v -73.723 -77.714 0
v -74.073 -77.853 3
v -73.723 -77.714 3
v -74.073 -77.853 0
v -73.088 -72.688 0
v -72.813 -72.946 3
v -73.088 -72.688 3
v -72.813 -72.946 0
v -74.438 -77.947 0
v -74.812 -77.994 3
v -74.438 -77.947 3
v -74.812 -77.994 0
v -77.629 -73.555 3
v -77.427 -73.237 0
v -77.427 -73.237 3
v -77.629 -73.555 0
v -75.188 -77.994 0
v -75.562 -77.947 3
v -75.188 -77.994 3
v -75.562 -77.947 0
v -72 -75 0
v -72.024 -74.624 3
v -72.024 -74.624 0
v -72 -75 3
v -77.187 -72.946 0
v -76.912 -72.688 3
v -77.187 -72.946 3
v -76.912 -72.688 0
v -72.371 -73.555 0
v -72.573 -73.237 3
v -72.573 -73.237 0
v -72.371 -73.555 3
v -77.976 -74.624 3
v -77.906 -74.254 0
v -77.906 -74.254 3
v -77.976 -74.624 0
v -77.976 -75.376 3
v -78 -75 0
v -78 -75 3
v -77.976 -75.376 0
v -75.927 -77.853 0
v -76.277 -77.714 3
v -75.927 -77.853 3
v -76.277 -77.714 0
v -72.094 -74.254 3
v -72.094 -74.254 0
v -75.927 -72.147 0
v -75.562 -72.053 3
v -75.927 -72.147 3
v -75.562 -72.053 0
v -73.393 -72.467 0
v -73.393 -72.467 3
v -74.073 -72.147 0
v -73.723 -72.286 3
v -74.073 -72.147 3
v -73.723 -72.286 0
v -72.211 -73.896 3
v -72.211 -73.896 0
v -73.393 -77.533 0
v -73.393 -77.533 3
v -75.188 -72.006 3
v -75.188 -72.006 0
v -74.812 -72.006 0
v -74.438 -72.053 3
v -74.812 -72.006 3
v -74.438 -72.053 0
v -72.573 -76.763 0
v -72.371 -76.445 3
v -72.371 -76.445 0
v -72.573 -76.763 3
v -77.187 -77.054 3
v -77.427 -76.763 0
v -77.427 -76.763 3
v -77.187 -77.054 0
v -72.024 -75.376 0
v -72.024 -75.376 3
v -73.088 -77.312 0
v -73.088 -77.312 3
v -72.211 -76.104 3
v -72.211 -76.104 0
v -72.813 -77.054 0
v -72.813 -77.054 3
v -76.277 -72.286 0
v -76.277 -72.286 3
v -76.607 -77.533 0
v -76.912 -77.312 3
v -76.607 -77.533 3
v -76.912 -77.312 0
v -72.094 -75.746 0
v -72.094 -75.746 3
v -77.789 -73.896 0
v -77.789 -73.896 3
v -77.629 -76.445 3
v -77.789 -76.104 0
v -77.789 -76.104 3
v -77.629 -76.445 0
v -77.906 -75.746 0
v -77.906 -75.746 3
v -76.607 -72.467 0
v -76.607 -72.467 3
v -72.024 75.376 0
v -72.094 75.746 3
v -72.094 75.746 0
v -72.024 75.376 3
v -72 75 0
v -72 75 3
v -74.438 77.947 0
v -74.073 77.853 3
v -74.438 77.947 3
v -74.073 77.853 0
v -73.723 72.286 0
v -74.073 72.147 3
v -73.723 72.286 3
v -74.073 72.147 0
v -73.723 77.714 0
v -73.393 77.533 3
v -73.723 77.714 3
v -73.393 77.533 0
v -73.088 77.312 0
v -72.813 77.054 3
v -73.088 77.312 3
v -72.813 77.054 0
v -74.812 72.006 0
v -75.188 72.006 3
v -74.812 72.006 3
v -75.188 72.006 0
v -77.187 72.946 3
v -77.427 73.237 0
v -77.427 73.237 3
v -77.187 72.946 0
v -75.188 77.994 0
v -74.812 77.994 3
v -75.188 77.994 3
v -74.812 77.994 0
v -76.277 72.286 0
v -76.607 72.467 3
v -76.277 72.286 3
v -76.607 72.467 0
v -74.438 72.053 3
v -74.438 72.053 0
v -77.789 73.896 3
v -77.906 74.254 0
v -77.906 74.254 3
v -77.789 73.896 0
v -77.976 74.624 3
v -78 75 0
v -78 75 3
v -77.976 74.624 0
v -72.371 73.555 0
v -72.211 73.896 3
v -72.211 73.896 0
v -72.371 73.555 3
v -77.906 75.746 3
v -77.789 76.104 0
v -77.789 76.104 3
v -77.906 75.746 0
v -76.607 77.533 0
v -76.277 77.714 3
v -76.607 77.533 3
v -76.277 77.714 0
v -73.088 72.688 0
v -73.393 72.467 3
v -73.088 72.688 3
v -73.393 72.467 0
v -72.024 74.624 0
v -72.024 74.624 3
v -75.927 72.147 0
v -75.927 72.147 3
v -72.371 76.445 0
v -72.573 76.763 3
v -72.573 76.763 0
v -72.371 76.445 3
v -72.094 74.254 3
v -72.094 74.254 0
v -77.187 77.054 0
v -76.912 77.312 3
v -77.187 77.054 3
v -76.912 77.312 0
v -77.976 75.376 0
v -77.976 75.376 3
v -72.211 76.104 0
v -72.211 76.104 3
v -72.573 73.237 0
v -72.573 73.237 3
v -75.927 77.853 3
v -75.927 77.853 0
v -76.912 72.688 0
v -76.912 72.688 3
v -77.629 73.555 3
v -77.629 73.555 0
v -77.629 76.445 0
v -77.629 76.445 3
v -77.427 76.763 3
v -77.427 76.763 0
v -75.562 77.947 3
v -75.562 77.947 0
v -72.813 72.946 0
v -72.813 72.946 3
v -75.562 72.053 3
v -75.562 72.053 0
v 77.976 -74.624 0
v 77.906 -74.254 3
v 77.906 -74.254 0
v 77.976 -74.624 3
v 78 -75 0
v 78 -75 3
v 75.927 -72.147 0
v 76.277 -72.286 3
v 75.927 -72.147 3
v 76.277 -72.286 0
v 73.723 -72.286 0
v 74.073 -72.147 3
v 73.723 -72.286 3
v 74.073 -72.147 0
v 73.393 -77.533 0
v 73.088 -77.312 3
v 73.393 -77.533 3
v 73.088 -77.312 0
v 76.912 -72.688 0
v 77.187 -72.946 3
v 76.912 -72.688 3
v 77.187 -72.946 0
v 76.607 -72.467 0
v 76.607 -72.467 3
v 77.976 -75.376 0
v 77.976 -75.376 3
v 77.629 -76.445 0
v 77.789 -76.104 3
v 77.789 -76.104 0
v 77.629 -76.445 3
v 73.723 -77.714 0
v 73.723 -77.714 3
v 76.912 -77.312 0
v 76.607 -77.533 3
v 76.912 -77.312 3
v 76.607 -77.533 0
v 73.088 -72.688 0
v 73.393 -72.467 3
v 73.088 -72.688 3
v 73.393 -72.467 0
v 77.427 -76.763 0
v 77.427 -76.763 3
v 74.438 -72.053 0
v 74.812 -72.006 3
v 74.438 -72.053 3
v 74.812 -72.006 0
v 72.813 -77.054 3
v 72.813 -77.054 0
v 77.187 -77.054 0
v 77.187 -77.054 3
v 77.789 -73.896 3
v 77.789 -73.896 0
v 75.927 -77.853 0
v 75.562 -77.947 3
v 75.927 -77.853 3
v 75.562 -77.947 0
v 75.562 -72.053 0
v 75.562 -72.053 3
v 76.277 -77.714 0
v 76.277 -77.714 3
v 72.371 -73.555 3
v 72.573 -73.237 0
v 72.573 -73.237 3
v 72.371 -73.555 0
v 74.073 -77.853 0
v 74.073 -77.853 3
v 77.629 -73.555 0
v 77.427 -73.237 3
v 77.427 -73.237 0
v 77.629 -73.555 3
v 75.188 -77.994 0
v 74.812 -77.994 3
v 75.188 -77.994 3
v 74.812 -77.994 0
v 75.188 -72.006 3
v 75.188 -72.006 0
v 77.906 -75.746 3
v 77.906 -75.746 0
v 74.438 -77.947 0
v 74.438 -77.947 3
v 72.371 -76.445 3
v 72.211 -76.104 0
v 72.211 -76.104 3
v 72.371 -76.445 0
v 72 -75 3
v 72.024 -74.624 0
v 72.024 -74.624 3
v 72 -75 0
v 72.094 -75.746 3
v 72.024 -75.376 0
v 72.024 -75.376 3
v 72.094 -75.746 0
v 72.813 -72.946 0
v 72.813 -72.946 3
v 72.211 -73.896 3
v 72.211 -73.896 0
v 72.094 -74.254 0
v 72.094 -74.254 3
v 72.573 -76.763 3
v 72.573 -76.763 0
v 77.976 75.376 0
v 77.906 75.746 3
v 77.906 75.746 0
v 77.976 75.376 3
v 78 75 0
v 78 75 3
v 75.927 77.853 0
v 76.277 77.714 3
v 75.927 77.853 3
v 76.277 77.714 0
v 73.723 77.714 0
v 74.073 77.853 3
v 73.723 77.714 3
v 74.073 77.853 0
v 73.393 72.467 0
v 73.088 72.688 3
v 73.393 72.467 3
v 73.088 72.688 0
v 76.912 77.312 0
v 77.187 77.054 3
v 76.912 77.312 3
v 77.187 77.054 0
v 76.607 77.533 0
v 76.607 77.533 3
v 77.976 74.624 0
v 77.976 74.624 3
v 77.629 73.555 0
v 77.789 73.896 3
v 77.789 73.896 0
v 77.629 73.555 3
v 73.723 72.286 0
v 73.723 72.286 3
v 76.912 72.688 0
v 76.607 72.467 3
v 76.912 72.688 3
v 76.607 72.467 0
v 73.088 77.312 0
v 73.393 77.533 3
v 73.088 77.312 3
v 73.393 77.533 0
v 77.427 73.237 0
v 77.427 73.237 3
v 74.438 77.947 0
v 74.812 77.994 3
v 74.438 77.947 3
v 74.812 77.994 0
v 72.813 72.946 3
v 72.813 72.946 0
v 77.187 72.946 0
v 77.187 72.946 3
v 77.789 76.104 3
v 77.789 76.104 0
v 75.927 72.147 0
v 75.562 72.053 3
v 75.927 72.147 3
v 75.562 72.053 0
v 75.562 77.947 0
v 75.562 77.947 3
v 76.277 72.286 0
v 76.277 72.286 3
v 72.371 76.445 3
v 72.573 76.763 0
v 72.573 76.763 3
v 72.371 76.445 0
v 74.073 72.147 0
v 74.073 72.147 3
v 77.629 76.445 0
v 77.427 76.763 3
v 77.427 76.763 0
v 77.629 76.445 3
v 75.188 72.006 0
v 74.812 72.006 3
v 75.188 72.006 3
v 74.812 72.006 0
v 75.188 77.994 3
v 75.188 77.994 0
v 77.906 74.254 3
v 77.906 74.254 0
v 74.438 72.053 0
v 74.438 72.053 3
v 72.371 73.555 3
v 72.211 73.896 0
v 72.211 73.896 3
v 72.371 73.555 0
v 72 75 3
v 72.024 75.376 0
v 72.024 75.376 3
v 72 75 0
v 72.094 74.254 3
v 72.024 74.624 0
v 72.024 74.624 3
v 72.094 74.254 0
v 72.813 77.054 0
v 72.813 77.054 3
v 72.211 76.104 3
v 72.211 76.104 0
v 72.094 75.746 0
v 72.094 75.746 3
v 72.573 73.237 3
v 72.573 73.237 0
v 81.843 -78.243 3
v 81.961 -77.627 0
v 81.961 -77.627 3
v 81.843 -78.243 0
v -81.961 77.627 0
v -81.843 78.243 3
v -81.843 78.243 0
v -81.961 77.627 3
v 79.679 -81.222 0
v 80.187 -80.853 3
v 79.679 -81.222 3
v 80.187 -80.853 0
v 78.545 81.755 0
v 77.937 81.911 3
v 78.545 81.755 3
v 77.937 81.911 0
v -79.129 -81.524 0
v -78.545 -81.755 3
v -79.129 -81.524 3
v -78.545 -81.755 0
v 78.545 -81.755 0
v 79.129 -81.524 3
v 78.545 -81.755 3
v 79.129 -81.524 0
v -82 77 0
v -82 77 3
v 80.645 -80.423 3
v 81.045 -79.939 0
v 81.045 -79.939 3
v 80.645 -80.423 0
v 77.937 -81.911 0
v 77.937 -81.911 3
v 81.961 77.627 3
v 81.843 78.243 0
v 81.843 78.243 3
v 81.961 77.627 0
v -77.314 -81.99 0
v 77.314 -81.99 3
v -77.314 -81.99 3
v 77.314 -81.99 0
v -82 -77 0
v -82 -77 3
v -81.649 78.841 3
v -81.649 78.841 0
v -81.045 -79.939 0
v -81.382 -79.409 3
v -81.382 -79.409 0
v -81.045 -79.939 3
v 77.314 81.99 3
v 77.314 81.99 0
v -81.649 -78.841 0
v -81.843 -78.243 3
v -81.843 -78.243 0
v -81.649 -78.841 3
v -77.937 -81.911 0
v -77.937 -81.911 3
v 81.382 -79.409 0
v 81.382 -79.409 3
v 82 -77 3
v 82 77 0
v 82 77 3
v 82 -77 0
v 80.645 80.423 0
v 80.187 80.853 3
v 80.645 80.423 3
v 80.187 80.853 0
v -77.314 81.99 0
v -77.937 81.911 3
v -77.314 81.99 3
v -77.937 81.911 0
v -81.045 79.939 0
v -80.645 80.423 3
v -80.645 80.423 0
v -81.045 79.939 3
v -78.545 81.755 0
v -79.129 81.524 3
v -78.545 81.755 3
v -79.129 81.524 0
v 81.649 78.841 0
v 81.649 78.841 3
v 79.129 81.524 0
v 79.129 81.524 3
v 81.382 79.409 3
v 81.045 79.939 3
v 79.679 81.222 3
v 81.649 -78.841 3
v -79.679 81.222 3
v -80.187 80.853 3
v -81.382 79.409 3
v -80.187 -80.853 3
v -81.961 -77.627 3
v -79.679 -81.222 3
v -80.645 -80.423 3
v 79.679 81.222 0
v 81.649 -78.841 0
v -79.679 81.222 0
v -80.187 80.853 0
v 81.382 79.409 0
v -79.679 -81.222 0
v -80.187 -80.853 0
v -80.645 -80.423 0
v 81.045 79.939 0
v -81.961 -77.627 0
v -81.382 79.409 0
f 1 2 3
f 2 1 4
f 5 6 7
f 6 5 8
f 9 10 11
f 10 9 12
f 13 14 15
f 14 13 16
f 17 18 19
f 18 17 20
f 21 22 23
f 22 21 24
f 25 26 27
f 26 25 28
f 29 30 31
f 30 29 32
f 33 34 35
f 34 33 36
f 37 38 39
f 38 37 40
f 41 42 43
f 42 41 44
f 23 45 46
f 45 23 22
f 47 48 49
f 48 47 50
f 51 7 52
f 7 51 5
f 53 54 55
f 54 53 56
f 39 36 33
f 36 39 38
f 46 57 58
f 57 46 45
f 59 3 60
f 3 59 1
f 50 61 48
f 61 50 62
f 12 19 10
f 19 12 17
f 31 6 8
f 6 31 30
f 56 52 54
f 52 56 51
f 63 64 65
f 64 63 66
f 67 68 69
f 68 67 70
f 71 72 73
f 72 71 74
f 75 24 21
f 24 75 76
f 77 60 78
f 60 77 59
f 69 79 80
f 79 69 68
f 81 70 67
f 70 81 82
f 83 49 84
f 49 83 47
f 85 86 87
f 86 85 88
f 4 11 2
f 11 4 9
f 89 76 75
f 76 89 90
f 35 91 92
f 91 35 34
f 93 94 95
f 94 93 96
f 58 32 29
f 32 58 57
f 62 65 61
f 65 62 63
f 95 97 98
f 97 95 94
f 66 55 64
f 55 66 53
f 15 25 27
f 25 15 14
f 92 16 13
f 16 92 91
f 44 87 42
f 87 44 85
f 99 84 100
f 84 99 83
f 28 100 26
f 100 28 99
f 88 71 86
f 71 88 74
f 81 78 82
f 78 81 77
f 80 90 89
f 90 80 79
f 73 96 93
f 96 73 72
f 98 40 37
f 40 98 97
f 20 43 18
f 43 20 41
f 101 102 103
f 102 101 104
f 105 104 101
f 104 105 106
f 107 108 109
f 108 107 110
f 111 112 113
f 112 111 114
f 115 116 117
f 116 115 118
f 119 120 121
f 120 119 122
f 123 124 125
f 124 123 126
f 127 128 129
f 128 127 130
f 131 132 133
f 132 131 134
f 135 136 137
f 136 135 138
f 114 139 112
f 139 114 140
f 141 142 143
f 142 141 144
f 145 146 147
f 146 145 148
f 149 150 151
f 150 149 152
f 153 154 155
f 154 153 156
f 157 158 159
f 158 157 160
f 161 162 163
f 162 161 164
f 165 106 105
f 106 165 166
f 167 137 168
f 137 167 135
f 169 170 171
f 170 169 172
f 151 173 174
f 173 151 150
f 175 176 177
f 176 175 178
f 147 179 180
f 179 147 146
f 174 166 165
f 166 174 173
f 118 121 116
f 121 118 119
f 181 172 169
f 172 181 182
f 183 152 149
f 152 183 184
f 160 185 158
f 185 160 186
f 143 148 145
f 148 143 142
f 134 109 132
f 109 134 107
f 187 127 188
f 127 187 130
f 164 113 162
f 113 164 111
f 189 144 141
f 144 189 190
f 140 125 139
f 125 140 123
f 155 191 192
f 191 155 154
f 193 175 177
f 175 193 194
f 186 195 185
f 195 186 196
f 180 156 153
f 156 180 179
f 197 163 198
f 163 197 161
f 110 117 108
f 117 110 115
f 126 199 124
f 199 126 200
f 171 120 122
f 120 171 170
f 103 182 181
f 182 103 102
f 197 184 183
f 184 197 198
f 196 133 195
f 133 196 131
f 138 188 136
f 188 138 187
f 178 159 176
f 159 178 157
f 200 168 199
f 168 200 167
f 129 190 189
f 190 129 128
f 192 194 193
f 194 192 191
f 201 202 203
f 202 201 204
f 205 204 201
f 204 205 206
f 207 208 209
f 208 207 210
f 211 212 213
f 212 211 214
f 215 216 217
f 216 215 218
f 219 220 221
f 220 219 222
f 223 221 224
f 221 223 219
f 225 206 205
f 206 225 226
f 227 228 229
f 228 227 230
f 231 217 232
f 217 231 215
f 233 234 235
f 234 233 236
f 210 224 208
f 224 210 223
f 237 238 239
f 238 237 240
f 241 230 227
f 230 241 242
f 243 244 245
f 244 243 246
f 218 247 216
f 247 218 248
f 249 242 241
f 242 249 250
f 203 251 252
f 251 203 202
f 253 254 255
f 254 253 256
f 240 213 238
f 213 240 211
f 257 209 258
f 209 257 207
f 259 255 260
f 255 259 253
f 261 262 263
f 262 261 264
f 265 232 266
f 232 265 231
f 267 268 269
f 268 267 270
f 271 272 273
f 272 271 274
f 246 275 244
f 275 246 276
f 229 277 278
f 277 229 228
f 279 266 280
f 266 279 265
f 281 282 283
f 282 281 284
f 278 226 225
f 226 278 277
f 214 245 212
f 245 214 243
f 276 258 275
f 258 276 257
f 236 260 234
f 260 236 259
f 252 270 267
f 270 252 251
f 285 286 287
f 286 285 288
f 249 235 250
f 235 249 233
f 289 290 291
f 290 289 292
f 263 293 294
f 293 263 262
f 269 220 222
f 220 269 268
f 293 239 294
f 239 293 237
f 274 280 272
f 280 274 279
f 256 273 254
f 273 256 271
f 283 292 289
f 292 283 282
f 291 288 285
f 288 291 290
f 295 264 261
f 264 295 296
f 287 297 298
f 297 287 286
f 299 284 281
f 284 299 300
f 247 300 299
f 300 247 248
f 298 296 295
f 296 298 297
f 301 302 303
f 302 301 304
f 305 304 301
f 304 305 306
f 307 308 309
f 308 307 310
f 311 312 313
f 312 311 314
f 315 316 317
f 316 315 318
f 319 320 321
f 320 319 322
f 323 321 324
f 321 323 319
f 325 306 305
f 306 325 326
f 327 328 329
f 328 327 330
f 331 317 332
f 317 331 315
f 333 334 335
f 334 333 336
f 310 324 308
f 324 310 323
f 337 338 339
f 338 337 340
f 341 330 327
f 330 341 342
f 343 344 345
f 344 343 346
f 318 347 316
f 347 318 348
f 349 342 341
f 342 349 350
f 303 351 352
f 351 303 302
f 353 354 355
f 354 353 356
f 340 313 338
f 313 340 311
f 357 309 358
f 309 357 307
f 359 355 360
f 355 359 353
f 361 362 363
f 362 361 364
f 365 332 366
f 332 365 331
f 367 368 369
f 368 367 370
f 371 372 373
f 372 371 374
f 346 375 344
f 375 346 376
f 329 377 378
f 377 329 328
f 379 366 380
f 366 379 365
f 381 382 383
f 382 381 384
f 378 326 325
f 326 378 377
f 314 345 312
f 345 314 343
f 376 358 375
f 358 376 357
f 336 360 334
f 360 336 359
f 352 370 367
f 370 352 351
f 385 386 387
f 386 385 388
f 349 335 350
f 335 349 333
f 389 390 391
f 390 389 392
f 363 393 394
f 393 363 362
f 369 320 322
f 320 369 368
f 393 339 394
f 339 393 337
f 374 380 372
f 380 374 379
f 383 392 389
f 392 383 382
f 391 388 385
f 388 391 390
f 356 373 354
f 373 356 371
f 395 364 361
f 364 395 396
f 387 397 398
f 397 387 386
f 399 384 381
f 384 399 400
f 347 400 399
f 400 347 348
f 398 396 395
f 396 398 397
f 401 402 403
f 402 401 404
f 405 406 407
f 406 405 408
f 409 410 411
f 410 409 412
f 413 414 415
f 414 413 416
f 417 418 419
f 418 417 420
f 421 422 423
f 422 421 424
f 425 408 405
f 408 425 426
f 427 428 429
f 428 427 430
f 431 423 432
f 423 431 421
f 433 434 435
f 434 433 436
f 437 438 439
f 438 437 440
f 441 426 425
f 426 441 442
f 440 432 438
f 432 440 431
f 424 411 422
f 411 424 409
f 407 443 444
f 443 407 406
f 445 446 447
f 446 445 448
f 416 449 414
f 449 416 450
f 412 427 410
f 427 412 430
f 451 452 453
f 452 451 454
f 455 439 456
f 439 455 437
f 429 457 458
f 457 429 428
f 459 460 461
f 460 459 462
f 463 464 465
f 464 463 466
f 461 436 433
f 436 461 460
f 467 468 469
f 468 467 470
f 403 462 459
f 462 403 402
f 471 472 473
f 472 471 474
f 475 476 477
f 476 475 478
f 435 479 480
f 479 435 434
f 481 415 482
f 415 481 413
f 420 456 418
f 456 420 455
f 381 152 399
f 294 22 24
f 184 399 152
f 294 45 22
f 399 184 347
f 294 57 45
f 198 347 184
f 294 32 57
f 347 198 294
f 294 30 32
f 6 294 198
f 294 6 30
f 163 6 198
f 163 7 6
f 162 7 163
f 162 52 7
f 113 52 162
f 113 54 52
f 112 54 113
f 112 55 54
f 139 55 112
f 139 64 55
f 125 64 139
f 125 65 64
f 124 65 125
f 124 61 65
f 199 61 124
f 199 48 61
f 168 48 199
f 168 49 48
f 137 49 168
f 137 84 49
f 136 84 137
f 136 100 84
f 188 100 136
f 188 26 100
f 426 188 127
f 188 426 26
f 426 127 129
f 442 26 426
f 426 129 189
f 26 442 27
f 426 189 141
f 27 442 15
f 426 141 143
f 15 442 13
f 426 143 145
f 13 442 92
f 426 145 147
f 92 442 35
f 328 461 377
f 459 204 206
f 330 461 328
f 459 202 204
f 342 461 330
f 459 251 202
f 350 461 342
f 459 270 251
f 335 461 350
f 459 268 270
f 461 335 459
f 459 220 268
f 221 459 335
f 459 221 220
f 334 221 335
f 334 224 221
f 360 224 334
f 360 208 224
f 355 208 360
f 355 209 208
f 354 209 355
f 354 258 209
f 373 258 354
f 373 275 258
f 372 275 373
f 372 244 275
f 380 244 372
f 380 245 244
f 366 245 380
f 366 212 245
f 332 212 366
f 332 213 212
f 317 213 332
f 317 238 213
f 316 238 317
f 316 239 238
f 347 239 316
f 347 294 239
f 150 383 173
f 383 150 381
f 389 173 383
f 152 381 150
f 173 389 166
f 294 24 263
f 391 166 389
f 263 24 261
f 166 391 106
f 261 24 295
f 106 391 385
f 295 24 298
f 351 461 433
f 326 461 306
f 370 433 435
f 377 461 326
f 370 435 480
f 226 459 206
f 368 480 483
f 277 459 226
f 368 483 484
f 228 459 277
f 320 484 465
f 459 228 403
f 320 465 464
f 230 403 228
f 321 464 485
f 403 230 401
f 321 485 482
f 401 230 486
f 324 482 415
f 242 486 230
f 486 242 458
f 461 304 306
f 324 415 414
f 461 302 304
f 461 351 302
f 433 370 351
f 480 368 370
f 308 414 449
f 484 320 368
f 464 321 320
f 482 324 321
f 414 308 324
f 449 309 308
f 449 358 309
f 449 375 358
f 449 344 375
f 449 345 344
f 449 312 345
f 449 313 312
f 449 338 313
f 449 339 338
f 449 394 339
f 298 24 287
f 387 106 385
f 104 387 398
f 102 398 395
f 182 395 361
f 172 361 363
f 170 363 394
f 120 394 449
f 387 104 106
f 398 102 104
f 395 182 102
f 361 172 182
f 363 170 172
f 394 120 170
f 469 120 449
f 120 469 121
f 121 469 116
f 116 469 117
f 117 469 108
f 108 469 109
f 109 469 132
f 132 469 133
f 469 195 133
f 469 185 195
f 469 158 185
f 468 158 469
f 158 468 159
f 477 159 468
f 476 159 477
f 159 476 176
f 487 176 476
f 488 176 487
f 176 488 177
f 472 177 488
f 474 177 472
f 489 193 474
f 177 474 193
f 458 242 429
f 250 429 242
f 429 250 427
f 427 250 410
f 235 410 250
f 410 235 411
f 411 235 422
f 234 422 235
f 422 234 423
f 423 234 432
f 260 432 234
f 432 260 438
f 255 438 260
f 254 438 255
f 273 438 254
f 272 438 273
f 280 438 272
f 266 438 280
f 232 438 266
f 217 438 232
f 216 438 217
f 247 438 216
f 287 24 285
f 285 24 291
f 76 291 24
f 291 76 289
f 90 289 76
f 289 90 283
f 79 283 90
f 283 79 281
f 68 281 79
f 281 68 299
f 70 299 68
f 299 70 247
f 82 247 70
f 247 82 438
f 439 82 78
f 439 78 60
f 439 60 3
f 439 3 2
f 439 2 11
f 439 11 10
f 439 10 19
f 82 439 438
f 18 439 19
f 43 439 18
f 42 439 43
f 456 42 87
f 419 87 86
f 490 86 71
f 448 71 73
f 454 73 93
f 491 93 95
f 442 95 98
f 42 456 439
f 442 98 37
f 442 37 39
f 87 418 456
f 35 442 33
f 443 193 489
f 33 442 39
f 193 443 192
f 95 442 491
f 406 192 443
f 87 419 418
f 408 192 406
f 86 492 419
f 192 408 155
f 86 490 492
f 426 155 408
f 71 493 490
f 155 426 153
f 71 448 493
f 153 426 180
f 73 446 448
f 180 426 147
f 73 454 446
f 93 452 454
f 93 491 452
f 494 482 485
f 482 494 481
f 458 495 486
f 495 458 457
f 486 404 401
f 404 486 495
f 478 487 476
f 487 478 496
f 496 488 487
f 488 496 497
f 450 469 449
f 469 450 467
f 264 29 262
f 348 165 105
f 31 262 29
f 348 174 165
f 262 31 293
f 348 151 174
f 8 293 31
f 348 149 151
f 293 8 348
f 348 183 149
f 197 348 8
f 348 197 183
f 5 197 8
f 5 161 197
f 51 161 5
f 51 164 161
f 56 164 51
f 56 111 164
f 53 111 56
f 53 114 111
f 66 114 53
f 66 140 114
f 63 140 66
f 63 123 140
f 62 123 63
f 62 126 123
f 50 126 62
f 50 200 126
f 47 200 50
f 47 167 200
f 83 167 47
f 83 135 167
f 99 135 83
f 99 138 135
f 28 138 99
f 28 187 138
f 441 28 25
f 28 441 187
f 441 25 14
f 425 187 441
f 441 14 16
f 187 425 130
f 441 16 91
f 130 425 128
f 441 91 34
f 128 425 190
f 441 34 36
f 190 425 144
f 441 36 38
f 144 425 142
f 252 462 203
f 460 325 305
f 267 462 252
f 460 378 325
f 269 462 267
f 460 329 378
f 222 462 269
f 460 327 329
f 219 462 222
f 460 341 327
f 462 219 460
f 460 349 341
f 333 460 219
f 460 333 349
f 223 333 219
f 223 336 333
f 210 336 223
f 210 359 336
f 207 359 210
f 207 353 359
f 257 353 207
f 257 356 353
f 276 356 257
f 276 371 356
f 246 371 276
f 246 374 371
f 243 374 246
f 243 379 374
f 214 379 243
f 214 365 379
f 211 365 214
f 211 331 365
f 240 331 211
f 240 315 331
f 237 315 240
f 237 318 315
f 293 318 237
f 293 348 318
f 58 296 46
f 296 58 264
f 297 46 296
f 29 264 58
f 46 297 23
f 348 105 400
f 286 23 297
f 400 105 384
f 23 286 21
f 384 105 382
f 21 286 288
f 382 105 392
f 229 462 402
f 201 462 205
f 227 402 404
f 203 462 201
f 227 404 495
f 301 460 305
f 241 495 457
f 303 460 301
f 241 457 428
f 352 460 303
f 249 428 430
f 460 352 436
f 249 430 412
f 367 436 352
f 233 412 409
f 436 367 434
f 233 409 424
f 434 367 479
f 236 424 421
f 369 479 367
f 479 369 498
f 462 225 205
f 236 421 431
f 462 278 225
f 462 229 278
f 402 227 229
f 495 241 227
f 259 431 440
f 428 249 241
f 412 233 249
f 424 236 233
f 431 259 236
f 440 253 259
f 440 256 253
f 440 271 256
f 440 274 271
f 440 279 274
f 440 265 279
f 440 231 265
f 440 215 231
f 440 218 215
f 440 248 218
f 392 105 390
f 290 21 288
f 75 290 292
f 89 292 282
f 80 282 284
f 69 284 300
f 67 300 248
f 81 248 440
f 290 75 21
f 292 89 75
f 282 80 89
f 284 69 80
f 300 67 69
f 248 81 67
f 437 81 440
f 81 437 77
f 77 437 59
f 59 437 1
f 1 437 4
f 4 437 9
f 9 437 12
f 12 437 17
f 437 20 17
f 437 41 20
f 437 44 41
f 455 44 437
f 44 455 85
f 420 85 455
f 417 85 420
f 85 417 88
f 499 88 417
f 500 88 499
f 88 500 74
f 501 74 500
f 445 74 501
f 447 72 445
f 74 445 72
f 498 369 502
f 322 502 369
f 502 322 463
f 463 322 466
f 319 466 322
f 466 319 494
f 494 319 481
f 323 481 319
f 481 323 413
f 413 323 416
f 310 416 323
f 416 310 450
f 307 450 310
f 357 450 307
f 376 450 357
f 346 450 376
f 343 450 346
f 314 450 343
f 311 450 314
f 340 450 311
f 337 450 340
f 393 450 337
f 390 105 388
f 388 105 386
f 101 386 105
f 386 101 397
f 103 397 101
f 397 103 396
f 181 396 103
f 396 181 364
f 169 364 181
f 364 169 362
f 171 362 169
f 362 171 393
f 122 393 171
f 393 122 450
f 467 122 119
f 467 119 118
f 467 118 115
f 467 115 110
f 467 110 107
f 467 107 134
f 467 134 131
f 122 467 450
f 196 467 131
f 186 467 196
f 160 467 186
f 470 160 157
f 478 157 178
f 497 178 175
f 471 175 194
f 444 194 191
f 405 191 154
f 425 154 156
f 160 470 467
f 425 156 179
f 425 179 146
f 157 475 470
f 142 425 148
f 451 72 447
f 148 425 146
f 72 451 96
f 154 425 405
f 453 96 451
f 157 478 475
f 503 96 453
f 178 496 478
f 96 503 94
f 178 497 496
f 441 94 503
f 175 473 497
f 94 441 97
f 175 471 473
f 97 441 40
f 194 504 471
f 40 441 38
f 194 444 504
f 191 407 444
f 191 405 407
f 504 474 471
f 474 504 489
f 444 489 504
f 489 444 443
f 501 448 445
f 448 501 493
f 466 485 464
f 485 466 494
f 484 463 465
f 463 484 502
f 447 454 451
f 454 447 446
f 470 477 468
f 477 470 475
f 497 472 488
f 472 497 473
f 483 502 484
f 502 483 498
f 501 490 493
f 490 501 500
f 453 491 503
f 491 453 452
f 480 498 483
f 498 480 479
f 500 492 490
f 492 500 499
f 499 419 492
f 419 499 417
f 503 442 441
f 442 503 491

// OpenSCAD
$fn = 50;


difference() {
	union() {
		hull() {
			translate(v = [-77.0000000000, 77.0000000000, 0]) {
				cylinder(h = 3, r = 5);
			}
			translate(v = [77.0000000000, 77.0000000000, 0]) {
				cylinder(h = 3, r = 5);
			}
			translate(v = [-77.0000000000, -77.0000000000, 0]) {
				cylinder(h = 3, r = 5);
			}
			translate(v = [77.0000000000, -77.0000000000, 0]) {
				cylinder(h = 3, r = 5);
			}
		}
	}
	union() {
		translate(v = [-75.0000000000, -75.0000000000, -100.0000000000]) {
			cylinder(h = 200, r = 3.0000000000);
		}
		translate(v = [-75.0000000000, 75.0000000000, -100.0000000000]) {
			cylinder(h = 200, r = 3.0000000000);
		}
		translate(v = [75.0000000000, -75.0000000000, -100.0000000000]) {
			cylinder(h = 200, r = 3.0000000000);
		}
		translate(v = [75.0000000000, 75.0000000000, -100.0000000000]) {
			cylinder(h = 200, r = 3.0000000000);
		}
	}
}
